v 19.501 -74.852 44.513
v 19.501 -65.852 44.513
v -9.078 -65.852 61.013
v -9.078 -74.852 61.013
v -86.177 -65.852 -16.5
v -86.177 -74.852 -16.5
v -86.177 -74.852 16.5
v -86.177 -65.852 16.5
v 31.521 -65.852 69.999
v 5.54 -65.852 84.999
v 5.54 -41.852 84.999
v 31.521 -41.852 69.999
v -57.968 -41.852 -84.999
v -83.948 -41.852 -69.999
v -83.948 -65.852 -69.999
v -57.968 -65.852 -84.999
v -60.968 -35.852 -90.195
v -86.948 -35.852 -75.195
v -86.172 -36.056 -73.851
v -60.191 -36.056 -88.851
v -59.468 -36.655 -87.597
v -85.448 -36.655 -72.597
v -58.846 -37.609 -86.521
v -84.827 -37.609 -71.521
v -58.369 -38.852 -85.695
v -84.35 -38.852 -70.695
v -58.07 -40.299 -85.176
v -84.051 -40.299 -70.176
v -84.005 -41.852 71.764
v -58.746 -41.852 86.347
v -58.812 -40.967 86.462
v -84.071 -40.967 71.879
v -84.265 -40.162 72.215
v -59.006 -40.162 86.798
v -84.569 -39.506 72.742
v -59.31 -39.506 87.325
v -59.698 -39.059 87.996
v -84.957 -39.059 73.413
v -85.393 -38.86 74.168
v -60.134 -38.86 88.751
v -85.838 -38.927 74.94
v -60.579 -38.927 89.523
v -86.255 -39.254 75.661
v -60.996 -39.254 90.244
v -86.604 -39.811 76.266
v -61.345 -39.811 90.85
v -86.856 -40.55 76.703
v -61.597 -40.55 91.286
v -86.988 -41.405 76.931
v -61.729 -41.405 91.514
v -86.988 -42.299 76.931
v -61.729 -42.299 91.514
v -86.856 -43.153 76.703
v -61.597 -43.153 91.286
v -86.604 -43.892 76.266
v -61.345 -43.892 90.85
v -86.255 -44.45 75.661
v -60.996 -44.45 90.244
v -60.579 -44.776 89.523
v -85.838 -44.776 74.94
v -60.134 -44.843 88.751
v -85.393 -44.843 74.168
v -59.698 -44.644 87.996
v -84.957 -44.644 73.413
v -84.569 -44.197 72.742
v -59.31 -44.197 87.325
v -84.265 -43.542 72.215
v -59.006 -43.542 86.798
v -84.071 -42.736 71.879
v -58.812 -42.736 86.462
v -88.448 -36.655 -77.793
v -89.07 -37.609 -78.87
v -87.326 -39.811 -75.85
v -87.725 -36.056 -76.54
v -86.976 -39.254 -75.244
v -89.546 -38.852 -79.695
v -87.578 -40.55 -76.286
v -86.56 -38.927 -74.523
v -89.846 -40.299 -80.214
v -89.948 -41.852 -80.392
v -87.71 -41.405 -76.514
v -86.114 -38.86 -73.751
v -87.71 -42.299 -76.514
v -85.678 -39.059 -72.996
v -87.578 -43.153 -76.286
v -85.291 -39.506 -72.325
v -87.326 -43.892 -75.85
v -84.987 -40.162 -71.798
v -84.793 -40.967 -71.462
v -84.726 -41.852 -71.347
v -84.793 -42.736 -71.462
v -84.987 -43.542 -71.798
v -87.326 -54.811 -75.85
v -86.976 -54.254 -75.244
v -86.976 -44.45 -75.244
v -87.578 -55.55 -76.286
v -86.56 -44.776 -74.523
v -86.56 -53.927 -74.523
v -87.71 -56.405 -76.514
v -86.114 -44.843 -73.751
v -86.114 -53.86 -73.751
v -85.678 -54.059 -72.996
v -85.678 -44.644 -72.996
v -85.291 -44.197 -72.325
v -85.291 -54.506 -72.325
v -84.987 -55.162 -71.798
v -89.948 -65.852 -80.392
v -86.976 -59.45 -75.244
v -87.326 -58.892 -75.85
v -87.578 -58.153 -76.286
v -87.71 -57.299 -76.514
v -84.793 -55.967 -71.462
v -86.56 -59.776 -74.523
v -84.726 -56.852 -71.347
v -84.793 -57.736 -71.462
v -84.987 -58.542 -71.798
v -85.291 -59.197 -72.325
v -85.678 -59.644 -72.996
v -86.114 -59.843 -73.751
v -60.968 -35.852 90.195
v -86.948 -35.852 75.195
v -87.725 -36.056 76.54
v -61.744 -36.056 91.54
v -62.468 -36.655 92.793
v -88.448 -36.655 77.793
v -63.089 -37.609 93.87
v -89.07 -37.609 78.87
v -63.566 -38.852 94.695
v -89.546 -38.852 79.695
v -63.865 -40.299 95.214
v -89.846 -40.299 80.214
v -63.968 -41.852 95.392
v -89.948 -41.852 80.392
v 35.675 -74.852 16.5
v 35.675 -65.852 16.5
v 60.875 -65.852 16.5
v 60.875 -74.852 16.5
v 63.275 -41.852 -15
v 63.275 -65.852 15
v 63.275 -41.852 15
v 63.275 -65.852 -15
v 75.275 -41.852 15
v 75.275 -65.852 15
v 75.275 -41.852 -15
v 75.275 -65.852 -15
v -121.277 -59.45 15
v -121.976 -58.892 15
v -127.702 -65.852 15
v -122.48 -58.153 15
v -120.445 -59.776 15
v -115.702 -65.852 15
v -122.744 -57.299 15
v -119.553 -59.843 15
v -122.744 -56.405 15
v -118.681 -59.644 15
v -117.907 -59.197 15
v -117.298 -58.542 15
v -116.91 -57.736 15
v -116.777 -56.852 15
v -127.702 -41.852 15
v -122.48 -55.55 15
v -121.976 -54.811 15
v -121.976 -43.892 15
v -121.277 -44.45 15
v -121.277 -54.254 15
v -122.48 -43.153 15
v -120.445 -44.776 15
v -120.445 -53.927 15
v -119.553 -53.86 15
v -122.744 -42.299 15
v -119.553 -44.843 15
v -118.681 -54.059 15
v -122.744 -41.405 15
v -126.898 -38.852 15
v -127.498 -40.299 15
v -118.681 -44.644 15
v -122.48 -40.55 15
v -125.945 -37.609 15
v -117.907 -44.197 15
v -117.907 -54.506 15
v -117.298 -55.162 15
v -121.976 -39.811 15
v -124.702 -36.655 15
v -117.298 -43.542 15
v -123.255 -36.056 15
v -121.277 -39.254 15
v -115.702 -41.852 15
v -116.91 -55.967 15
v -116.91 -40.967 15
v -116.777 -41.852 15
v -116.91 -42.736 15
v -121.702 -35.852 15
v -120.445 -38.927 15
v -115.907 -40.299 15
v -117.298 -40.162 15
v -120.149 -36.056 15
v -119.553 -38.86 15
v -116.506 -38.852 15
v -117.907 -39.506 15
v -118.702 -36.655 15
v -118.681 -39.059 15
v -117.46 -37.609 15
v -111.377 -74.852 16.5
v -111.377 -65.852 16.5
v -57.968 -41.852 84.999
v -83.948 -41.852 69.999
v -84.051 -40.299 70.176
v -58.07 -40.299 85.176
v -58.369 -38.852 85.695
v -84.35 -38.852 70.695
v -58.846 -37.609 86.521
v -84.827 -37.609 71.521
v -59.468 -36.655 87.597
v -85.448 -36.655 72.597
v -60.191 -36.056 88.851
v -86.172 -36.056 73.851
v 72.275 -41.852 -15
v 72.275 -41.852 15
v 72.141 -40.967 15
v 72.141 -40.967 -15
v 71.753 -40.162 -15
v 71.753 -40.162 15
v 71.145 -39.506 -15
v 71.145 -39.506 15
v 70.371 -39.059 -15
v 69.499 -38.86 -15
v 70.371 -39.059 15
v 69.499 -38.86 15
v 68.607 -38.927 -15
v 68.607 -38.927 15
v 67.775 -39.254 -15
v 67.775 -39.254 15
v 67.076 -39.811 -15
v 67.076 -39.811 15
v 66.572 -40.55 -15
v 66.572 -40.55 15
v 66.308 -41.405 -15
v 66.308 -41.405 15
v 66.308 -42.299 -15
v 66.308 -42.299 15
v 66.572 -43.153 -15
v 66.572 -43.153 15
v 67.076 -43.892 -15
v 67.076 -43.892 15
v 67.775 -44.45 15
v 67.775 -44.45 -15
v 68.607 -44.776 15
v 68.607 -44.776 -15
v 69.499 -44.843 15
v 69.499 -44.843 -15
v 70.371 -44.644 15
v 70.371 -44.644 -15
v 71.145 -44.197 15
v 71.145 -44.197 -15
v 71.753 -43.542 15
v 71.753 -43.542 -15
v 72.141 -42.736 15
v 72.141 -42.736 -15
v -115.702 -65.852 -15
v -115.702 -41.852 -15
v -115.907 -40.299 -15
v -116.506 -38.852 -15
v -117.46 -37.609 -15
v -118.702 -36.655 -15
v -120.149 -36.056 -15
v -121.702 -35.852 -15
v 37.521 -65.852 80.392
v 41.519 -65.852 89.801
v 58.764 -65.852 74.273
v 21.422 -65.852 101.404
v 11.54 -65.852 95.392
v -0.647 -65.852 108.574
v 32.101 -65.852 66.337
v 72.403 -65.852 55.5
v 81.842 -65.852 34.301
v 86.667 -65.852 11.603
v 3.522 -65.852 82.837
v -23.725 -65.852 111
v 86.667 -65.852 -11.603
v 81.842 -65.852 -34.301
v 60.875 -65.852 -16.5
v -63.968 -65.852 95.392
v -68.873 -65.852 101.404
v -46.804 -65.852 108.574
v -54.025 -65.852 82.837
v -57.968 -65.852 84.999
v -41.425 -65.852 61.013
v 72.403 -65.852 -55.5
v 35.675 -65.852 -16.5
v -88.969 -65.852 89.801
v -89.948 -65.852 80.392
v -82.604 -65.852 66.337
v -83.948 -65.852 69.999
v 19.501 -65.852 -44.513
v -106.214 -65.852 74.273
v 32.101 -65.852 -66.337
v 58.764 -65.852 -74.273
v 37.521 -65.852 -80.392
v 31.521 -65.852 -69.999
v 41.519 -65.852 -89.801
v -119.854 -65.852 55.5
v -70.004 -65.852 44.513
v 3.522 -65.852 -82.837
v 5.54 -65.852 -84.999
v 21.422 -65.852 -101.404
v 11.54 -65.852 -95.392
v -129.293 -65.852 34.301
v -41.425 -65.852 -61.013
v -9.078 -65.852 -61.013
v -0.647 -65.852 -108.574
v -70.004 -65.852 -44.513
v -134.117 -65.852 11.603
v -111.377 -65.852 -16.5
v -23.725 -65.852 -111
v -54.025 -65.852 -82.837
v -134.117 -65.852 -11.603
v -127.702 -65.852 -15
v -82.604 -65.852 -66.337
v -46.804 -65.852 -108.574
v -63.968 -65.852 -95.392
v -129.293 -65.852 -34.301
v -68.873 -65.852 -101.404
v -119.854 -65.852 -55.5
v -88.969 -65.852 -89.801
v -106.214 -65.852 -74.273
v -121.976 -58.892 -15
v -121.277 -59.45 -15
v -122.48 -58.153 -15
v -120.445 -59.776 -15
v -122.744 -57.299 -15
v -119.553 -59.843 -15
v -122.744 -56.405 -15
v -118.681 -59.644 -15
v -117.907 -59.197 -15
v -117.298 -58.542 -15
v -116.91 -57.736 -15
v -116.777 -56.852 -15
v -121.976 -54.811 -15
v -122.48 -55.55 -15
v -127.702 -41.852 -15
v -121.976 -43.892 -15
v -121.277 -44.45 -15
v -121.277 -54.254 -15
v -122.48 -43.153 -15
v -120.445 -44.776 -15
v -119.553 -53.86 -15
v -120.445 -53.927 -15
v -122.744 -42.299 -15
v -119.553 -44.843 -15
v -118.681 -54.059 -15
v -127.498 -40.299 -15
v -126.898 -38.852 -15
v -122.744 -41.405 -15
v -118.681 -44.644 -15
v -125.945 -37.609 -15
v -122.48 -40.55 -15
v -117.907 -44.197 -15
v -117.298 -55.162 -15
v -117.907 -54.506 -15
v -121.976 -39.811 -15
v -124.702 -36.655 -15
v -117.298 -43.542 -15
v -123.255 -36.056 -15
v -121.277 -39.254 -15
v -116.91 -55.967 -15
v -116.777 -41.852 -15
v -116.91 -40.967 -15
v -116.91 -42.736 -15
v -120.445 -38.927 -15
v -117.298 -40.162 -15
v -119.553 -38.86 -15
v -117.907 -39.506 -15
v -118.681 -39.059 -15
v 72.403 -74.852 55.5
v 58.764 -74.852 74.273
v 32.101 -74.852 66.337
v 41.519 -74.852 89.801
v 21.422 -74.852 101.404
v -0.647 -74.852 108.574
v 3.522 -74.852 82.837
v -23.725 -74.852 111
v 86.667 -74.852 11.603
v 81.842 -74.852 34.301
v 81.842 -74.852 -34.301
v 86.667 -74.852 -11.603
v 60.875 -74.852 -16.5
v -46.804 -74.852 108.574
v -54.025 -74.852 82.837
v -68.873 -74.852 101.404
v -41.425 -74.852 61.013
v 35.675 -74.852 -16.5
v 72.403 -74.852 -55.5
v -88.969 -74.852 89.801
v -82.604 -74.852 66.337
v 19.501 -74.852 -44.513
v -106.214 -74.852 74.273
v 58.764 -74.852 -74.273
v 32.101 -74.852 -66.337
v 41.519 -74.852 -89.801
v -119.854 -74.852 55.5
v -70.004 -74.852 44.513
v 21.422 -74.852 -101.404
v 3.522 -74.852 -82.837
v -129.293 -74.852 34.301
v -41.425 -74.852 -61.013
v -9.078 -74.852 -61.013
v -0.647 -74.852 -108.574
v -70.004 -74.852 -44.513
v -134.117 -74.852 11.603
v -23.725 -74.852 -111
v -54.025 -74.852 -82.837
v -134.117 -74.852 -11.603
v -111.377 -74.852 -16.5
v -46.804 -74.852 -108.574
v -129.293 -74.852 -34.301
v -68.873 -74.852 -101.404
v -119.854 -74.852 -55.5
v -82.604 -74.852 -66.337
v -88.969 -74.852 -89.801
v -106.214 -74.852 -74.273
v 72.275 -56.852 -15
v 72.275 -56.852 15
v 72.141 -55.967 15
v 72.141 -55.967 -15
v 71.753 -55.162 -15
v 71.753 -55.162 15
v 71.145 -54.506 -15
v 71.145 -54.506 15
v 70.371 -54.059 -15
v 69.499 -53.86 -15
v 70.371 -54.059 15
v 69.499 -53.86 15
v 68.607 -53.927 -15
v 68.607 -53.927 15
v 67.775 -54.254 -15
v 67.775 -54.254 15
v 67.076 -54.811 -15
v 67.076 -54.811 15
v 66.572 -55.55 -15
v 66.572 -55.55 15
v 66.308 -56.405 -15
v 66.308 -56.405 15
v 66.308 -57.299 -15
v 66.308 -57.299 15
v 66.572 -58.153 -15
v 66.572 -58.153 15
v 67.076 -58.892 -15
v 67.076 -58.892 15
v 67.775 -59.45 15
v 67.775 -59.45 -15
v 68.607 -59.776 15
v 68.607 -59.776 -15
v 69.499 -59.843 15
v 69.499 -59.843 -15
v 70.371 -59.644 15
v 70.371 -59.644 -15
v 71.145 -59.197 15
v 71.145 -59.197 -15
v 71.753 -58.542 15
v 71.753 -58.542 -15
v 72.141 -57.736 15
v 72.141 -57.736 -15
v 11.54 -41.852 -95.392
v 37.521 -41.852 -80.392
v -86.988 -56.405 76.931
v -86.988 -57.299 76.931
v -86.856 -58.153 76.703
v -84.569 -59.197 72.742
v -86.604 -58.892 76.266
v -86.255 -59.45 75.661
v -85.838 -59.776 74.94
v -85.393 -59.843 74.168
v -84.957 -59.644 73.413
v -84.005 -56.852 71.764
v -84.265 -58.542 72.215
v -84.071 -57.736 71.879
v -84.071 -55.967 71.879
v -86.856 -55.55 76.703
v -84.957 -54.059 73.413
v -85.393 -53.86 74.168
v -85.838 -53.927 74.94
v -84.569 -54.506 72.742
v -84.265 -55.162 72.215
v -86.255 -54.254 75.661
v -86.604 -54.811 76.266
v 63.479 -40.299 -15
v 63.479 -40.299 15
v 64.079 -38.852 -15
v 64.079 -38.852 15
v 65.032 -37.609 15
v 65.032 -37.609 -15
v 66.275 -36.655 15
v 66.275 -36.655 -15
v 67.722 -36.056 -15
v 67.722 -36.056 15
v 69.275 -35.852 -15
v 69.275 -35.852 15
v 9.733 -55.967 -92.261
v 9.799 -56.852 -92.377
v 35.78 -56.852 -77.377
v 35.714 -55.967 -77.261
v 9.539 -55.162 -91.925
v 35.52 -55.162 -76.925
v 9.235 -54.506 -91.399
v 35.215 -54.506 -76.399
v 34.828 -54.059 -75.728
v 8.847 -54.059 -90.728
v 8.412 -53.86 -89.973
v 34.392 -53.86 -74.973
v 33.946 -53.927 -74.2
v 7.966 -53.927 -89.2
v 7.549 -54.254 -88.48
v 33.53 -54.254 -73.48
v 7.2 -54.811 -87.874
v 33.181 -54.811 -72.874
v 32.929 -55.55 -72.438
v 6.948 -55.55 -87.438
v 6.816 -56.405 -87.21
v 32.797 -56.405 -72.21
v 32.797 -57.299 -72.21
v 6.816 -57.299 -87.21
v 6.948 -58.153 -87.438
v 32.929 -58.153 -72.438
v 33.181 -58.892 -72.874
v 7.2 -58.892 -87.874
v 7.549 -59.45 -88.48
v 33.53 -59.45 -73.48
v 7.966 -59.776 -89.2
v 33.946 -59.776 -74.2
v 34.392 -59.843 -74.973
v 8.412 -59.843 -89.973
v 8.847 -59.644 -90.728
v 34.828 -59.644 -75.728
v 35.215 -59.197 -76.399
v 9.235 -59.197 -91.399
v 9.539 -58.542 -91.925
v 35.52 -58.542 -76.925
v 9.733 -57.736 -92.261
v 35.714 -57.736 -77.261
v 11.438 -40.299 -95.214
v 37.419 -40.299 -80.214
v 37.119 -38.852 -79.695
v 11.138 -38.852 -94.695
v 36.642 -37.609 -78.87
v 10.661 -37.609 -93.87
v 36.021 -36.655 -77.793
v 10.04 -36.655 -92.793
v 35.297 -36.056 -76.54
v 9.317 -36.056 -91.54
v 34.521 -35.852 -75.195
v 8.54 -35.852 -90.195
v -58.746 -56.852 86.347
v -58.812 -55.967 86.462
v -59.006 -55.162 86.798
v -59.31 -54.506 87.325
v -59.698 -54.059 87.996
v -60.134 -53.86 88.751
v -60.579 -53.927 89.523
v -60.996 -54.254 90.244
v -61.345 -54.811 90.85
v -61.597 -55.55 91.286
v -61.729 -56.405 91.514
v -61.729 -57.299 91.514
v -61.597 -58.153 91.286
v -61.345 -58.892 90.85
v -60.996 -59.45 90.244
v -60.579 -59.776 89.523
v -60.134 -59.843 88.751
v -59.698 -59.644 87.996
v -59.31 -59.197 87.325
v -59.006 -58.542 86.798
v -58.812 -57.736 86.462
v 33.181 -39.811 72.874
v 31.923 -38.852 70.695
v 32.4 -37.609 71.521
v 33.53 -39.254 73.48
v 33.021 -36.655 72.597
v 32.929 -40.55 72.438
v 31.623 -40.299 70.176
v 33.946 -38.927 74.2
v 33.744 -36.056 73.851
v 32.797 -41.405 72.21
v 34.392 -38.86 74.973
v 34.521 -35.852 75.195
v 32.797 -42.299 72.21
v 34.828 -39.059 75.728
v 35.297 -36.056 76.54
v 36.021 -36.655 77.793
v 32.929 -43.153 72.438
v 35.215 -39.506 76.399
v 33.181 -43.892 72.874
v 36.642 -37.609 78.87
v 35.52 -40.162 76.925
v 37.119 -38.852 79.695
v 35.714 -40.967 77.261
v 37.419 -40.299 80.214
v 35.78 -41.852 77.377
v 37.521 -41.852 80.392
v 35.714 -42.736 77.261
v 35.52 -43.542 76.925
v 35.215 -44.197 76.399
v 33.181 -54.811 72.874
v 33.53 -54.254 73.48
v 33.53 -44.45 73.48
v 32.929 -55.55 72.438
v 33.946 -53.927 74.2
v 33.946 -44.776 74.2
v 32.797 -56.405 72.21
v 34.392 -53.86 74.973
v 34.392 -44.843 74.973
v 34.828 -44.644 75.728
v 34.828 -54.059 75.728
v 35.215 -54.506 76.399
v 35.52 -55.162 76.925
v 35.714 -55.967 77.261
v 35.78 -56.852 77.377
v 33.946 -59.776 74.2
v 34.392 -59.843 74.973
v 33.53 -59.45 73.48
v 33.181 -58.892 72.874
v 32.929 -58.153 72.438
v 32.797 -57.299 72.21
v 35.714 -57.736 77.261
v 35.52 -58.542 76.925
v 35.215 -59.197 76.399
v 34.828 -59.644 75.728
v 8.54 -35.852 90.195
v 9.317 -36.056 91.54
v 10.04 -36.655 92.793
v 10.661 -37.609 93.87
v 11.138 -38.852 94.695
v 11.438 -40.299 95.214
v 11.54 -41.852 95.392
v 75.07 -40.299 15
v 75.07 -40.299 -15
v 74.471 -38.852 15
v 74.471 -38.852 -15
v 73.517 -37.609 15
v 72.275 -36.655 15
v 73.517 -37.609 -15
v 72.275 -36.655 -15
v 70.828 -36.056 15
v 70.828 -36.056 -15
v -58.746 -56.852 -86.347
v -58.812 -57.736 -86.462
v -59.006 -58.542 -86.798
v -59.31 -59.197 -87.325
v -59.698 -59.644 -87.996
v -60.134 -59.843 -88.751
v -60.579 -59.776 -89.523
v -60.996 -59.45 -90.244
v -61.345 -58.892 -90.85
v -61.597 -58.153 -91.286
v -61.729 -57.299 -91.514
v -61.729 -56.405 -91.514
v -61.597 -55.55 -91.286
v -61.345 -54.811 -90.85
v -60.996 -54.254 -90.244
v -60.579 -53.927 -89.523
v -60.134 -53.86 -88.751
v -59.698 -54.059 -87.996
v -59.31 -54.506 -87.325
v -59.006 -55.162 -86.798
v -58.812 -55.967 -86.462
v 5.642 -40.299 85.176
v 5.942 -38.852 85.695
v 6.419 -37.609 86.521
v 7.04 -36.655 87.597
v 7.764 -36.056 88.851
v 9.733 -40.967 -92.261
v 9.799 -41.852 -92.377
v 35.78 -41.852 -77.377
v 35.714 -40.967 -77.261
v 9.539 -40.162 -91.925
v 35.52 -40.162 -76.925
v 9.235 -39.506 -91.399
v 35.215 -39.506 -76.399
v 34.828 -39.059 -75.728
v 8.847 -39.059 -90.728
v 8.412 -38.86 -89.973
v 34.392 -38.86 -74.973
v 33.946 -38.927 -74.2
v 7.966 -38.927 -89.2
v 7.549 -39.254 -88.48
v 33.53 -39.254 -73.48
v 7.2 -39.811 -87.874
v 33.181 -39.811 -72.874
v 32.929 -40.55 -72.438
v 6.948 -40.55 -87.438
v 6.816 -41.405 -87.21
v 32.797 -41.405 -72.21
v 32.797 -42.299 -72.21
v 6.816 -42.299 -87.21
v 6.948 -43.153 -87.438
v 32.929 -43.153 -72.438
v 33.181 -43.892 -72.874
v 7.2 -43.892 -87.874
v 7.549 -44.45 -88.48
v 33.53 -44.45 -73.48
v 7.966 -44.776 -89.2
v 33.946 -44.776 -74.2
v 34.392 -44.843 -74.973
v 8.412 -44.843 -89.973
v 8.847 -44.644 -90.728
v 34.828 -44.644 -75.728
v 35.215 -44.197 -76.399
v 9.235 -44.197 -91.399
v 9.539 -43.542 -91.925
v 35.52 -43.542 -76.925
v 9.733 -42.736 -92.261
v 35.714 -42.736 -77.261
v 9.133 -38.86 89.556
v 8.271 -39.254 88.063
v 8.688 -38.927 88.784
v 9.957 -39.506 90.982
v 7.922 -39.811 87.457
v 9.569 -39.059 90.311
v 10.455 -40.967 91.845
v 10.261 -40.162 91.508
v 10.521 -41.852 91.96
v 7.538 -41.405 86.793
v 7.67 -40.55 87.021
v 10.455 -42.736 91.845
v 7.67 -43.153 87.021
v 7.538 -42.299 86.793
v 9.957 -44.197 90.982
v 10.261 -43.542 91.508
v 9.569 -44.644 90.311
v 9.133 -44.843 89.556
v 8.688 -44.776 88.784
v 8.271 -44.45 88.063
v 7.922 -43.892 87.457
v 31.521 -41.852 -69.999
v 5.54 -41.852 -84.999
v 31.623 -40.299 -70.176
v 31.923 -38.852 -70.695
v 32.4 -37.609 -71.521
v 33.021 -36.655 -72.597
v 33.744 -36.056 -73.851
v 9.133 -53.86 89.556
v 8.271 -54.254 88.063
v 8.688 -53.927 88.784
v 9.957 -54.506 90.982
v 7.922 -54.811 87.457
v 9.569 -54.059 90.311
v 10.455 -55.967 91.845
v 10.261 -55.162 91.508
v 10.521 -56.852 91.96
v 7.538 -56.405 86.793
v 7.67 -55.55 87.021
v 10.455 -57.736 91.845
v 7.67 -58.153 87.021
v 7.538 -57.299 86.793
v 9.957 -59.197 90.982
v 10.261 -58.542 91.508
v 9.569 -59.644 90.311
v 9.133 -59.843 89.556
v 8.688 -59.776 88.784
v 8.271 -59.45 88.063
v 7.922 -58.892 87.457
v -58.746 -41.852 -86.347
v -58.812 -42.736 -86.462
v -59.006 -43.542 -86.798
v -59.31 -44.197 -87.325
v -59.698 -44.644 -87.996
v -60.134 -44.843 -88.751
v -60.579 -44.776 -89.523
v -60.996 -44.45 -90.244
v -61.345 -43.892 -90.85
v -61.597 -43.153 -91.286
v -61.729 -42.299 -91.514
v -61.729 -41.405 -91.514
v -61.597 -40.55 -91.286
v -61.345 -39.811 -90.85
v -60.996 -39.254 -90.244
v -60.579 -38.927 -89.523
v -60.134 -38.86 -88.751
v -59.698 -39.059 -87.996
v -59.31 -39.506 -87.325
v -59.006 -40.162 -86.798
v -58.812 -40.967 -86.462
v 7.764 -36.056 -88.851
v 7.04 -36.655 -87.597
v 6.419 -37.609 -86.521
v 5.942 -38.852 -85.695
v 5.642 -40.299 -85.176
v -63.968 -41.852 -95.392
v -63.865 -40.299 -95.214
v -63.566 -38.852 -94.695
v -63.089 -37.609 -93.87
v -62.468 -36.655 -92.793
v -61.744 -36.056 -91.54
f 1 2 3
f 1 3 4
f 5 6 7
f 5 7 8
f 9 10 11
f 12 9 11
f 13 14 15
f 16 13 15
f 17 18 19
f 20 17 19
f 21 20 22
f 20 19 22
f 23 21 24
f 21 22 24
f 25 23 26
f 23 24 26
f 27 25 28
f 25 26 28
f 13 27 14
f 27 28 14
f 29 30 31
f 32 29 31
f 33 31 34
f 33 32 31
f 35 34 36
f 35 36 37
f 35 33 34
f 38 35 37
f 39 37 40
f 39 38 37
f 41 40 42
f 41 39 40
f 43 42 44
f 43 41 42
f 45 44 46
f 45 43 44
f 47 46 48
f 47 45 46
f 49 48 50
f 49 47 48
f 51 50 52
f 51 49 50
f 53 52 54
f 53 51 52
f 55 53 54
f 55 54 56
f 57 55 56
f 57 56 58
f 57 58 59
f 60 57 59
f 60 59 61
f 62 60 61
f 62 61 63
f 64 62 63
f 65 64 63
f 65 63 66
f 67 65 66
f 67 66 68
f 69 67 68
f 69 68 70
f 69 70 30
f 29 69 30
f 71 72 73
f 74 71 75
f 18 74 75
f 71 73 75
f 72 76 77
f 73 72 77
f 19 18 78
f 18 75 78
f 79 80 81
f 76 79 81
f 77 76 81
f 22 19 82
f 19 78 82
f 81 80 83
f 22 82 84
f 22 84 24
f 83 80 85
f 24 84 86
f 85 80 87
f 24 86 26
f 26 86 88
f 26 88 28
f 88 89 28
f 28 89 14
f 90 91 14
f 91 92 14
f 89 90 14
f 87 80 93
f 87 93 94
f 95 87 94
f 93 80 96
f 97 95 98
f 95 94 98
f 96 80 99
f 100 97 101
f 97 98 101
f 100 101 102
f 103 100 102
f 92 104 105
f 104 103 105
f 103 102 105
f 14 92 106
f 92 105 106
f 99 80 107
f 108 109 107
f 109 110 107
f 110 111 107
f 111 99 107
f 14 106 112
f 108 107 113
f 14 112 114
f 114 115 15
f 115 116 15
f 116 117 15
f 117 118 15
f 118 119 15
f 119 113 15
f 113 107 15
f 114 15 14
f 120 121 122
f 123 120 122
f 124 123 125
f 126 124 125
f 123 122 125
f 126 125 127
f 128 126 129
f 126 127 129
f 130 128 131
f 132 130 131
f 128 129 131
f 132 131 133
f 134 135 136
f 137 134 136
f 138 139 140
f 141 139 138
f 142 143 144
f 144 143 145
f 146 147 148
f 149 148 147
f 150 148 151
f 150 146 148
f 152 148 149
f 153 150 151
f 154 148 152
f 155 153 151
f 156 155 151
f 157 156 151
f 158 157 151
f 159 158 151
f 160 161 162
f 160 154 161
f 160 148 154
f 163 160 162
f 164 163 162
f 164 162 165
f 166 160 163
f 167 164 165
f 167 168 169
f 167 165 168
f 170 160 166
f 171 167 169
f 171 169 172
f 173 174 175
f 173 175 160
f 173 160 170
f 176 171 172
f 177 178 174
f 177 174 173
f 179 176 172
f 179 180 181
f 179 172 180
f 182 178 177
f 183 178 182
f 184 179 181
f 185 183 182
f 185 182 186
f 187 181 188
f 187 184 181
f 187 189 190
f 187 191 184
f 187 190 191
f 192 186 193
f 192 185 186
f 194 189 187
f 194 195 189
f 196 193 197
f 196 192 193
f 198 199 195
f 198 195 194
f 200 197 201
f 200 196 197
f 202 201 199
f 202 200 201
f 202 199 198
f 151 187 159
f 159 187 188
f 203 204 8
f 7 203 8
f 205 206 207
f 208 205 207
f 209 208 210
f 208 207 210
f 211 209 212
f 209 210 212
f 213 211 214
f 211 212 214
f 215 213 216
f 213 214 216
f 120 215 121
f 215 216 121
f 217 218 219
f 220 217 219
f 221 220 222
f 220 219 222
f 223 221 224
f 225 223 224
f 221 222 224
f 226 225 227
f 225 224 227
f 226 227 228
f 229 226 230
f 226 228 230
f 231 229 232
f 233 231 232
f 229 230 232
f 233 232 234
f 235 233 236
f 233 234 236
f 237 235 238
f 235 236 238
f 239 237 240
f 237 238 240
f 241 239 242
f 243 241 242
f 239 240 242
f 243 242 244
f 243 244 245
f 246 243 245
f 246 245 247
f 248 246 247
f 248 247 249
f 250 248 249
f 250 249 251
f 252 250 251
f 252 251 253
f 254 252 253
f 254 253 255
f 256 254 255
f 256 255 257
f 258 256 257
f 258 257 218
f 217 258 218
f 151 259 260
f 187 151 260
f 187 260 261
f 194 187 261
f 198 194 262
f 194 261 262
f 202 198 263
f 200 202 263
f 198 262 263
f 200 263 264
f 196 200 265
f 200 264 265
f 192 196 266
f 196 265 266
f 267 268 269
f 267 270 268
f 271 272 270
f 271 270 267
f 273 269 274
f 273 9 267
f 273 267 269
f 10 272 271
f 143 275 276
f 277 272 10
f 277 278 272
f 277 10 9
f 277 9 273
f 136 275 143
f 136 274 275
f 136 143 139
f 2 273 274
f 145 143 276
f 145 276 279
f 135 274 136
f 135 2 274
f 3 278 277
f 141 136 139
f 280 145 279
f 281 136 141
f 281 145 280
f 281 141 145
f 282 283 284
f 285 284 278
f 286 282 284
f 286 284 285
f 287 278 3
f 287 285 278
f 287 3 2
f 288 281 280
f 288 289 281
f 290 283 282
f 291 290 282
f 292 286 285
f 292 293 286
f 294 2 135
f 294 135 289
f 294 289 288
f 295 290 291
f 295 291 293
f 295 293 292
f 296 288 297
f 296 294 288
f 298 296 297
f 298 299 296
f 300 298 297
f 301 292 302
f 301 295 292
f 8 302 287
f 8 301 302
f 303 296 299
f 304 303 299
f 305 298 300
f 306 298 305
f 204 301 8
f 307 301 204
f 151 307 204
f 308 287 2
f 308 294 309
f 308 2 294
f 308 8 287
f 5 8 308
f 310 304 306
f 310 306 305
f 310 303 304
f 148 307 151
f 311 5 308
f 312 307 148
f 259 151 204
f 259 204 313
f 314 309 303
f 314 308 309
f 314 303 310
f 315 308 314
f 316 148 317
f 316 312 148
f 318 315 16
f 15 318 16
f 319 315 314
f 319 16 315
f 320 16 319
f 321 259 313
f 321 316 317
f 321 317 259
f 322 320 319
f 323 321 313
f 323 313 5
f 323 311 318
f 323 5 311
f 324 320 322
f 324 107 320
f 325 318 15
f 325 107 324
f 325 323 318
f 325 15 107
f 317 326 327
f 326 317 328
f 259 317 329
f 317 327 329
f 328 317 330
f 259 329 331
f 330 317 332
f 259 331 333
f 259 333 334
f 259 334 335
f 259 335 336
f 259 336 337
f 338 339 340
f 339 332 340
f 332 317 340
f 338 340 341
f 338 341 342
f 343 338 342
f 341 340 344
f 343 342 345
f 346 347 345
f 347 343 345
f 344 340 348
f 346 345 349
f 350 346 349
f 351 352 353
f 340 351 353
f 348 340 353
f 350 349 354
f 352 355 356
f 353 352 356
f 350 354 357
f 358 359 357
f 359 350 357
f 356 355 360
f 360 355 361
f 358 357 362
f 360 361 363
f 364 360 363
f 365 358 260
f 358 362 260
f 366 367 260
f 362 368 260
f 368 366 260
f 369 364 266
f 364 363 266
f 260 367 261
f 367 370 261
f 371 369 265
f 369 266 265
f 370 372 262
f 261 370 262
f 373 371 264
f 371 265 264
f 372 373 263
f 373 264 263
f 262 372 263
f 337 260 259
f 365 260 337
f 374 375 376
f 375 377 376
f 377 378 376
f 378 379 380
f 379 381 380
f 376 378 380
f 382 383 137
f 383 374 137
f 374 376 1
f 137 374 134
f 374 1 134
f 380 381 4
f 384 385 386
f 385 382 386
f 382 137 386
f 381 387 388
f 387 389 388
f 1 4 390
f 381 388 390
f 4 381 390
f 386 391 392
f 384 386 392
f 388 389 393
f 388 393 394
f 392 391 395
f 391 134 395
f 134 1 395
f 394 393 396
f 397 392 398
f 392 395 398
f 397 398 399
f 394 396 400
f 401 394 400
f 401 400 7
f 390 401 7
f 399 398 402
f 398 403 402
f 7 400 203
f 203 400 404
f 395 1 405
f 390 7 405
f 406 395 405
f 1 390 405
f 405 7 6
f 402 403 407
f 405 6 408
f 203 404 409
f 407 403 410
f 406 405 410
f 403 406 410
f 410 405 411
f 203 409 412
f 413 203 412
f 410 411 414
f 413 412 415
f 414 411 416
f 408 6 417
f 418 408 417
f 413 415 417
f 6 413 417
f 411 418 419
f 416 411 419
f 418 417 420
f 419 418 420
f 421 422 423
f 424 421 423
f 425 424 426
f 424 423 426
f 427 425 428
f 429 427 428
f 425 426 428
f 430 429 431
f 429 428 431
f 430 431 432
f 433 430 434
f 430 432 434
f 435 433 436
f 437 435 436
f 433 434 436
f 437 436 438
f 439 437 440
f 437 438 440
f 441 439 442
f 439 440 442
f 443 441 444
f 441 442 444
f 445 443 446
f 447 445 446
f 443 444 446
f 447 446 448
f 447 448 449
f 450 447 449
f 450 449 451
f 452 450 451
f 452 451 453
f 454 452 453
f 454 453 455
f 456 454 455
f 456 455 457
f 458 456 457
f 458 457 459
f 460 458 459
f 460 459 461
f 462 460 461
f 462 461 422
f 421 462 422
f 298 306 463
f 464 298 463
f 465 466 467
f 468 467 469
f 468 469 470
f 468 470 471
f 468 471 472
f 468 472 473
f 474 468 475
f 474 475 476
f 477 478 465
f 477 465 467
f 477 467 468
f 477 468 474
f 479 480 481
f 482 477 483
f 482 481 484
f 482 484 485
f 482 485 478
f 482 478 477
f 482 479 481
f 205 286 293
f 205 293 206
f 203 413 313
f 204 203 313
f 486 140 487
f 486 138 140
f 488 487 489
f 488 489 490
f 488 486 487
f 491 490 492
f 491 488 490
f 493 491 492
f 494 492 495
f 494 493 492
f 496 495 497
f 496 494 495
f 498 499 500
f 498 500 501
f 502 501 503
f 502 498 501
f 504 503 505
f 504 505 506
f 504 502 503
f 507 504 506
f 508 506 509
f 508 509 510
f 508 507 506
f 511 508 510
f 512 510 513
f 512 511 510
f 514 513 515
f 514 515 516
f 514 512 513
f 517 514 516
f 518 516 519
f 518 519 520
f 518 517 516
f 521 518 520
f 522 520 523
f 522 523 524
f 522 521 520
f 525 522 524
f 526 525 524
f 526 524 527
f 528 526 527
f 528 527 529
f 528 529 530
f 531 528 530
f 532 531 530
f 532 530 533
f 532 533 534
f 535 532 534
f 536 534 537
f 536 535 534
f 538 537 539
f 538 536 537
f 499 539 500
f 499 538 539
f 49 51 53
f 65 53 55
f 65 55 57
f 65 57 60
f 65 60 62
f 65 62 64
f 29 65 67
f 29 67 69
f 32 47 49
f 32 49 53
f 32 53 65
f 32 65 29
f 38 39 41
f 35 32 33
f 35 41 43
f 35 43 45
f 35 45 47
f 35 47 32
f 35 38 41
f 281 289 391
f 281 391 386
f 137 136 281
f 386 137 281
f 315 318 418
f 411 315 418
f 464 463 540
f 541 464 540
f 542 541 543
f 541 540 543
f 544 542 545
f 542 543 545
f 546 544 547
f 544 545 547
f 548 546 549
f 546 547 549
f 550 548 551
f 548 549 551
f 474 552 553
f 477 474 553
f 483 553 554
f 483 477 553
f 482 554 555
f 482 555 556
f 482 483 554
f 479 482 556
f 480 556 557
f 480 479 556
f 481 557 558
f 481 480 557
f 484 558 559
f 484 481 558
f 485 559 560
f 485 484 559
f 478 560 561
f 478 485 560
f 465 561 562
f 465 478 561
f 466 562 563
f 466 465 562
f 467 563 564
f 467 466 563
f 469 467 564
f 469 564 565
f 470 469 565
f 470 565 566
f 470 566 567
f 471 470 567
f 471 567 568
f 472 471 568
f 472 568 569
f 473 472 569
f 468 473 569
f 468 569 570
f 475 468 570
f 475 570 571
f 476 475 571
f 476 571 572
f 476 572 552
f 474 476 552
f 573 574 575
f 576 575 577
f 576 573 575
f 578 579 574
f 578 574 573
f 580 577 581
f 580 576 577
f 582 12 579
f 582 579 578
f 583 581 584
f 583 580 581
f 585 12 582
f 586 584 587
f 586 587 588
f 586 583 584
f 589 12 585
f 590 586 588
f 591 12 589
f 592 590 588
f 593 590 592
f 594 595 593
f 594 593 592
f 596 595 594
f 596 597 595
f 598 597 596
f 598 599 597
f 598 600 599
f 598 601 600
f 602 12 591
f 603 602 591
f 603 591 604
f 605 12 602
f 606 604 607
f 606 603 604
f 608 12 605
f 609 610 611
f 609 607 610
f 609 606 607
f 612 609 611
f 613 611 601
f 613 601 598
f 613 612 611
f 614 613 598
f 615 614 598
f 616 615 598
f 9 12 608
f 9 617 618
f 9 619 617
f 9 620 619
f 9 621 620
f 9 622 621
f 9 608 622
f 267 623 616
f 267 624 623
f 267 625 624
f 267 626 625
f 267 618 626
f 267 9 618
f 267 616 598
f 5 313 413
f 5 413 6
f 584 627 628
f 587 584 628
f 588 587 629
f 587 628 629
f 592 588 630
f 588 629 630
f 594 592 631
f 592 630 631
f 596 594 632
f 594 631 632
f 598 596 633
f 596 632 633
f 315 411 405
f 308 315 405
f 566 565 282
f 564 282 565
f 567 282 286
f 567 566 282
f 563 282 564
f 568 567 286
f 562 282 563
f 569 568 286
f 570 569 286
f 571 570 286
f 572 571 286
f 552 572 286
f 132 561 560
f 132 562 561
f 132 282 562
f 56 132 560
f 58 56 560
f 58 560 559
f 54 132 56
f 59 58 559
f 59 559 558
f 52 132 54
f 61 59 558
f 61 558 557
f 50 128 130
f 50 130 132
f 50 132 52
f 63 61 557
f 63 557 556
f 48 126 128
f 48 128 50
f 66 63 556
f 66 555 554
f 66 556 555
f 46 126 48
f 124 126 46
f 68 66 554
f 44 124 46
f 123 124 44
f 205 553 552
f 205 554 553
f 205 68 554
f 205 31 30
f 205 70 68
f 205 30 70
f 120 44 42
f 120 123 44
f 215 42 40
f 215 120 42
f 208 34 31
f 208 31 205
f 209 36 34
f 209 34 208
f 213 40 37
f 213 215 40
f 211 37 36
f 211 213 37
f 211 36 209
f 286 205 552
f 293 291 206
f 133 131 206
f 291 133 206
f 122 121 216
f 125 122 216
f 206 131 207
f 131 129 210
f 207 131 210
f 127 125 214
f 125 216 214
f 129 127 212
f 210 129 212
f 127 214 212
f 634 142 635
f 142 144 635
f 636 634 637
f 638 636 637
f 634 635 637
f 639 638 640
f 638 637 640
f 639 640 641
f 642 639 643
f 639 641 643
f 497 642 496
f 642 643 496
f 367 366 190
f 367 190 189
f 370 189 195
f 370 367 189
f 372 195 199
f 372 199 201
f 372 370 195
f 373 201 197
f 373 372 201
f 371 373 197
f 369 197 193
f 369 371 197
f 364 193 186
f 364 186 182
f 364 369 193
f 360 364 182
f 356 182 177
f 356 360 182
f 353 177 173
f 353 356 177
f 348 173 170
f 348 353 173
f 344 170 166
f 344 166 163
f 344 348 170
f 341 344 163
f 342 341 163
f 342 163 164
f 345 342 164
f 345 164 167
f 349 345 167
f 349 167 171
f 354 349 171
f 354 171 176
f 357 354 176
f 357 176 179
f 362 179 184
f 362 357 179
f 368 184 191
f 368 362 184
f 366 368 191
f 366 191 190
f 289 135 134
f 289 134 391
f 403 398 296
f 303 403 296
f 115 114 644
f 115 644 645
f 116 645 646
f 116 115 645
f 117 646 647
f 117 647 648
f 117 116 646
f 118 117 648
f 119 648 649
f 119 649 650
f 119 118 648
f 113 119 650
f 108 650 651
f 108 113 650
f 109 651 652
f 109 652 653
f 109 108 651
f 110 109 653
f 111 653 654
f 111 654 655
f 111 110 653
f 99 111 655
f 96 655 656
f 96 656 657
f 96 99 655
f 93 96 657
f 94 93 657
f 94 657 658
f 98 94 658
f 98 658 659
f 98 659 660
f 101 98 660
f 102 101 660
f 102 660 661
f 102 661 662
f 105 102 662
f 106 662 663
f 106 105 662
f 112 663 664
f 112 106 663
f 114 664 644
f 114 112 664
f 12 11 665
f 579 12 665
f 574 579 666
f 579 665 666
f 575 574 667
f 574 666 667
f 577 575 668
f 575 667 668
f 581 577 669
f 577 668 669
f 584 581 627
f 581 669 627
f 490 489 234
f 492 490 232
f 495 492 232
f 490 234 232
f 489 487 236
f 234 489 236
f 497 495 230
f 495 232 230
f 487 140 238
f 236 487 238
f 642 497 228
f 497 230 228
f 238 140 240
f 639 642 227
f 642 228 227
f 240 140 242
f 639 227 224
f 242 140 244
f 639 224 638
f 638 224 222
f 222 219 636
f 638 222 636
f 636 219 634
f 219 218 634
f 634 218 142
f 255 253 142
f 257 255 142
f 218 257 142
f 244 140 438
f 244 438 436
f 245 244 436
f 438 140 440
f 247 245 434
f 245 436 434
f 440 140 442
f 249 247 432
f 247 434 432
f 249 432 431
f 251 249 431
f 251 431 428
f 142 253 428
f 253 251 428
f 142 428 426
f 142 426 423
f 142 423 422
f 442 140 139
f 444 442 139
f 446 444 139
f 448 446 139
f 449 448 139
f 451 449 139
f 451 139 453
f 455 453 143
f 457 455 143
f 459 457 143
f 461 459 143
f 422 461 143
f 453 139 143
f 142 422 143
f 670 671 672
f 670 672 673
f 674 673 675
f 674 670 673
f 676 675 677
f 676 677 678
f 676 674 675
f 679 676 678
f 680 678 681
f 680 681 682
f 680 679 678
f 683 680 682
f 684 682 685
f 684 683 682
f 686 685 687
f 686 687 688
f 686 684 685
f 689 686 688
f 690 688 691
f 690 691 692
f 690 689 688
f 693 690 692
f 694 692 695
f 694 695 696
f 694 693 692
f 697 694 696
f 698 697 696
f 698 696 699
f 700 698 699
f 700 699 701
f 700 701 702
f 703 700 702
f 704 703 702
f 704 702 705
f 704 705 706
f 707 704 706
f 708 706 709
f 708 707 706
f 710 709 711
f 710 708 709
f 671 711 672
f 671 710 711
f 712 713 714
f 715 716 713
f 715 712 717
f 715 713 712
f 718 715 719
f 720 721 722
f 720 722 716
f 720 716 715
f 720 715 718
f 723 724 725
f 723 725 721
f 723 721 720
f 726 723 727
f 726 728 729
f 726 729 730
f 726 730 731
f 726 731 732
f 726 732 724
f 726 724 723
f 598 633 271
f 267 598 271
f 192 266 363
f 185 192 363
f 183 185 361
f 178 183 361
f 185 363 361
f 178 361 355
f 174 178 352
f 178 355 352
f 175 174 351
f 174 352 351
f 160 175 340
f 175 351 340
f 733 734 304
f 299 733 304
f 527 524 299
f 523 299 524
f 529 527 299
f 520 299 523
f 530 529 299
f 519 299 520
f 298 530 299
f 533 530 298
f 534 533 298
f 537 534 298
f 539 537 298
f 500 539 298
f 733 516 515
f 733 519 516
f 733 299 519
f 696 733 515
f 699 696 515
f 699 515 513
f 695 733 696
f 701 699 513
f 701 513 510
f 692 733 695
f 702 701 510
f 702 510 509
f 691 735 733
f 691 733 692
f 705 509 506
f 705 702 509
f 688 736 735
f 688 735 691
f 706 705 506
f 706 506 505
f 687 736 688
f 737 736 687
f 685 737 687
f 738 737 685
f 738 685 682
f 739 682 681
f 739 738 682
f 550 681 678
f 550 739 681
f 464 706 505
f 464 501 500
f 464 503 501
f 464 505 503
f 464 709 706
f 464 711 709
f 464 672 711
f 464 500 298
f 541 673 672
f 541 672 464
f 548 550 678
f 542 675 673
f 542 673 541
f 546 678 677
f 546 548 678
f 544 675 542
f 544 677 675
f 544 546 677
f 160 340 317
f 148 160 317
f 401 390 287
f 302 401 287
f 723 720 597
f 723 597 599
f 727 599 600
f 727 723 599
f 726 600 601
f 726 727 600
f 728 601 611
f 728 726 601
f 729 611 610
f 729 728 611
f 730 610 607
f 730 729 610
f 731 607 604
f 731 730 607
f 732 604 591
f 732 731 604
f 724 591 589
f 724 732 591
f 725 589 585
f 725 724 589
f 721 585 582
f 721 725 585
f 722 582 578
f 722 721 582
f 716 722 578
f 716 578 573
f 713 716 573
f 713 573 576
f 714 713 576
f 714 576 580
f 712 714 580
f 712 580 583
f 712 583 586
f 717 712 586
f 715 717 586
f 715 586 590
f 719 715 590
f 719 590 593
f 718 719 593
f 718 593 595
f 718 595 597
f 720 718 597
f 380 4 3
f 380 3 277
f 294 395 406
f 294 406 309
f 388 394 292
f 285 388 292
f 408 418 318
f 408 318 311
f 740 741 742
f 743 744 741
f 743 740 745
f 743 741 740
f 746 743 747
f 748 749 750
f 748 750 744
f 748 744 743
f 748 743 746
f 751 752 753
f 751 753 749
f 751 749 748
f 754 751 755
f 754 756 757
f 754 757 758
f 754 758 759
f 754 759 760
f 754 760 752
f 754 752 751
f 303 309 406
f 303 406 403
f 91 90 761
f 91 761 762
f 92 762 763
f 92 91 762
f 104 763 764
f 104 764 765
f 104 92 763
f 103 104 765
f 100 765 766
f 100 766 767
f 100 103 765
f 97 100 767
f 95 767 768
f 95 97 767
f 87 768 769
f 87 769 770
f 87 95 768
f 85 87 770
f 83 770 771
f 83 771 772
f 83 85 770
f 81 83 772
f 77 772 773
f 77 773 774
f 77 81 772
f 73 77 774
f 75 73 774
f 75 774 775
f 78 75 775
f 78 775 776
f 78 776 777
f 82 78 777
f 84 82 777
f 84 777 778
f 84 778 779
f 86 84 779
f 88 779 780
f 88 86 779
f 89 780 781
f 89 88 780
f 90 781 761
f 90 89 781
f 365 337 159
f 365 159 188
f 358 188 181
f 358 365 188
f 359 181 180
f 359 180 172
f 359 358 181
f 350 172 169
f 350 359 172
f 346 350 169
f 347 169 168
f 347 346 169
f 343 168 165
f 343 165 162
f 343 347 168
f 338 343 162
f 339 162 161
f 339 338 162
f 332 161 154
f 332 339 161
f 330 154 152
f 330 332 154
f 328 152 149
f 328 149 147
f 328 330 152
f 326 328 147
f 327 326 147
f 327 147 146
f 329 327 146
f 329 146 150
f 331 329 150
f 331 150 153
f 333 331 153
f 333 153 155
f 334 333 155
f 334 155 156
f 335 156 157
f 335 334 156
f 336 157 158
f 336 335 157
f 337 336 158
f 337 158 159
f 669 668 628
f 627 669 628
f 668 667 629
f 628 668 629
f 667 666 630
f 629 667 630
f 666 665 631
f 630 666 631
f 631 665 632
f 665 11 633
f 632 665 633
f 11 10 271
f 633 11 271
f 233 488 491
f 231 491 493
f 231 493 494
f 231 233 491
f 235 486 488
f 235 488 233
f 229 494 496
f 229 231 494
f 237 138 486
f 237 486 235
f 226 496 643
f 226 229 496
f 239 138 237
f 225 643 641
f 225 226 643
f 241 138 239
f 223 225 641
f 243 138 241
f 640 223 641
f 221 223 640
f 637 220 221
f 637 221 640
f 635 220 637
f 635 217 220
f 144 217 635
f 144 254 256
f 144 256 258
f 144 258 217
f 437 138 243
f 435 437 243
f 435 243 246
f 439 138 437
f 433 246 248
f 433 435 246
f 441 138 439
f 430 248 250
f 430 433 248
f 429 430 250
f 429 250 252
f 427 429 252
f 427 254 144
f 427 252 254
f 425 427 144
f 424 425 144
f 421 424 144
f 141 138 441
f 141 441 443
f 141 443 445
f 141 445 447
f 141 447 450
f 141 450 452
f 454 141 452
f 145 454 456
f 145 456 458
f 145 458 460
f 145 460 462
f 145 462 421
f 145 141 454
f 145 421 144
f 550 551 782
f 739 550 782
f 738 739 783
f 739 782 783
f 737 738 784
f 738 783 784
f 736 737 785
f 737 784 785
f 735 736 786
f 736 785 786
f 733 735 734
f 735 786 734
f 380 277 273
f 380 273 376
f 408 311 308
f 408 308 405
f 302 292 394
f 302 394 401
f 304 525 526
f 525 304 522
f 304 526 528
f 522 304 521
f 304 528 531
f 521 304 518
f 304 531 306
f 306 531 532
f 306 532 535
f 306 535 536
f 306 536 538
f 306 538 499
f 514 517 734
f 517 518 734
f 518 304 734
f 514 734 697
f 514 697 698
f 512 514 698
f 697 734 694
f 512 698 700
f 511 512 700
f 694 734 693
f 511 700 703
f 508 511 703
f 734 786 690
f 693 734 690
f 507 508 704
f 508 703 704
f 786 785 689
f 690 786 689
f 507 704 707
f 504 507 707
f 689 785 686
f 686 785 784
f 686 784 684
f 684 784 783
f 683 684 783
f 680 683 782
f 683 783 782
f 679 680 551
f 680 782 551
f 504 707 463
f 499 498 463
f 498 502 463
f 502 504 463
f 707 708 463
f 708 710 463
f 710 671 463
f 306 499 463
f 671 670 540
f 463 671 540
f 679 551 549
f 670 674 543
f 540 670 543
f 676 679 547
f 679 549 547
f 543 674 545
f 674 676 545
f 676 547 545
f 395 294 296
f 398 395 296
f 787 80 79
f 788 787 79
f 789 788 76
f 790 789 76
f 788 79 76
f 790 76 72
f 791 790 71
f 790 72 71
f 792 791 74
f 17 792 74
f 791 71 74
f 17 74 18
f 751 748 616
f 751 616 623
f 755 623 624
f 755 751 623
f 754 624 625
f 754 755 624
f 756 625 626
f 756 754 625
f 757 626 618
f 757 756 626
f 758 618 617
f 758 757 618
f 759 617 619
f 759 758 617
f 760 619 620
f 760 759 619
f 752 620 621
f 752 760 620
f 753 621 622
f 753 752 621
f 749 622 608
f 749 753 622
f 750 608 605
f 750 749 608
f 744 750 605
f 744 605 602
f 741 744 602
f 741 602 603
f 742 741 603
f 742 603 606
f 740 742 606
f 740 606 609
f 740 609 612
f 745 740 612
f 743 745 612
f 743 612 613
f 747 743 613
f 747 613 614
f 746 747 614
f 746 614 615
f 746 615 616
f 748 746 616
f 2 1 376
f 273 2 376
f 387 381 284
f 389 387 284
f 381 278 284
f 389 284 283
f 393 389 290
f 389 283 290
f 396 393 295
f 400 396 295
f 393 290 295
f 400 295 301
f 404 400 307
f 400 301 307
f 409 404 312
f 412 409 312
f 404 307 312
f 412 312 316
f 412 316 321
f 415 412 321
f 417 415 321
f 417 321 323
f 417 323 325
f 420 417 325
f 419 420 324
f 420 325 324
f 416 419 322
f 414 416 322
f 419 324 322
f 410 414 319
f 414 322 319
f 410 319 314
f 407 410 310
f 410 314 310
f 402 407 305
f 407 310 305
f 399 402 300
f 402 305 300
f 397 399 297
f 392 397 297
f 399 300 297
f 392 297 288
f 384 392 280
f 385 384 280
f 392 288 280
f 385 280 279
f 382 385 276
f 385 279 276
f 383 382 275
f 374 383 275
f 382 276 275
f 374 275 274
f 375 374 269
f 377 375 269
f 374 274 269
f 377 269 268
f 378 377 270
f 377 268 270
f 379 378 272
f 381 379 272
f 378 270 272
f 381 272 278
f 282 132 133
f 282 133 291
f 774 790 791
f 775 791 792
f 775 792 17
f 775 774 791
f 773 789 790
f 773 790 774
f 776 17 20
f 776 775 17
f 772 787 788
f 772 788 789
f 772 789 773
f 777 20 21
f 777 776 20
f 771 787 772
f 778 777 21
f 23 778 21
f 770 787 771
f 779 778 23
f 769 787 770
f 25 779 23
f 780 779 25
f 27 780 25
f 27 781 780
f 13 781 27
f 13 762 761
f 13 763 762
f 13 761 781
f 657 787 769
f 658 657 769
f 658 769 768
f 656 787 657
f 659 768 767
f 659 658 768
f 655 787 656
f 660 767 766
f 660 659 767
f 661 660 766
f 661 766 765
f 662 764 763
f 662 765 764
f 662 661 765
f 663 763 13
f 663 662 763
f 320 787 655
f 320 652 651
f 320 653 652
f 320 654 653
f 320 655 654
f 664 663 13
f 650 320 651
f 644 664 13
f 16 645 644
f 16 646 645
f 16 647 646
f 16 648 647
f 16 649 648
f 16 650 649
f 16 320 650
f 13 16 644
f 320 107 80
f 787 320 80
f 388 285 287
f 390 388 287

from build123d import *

# Parameters (mm, degrees)
SKETCH_6_W                     = 111
SKETCH_6_H                     = 9
SKETCH_7_W                     = 12
SKETCH_7_H                     = 30
EXTRUDE_5_DEPTH                = 30
SKETCH_8_R                     = 3
CUT_EXTRUDE_2_DEPTH            = 200.07204757
FILLET_2_R                     = 6
SKETCH_9_W                     = 25.2
SKETCH_9_H                     = 33
CUT_EXTRUDE_3_DEPTH            = 178.121180423
PATTERN_START                  = -15
PATTERN_CIRCULAR_3_OUTLINE_R   = 3
PATTERN_CIRCULAR_3_DEPTH       = 30
PATTERN_START_2                = -37.701760736
PATTERN_CIRCULAR_3_2_OUTLINE_R = 3
PATTERN_CIRCULAR_3_2_DEPTH     = 30
PATTERN_CIRCULAR_3_3_OUTLINE_R = 3
PATTERN_CIRCULAR_3_3_DEPTH     = 0.833530395
PATTERN_CIRCULAR_3_4_OUTLINE_R = 3
PATTERN_CIRCULAR_3_4_DEPTH     = 30
PATTERN_CIRCULAR_3_5_OUTLINE_R = 3
PATTERN_CIRCULAR_3_5_DEPTH     = 0.833530395
PATTERN_START_3                = -16.5
PATTERN_CIRCULAR_3_6_OUTLINE_W = 25.2
PATTERN_CIRCULAR_3_6_OUTLINE_H = 9
PATTERN_CIRCULAR_3_6_DEPTH     = 33
PATTERN_START_4                = -38.368230341
PATTERN_CIRCULAR_3_7_OUTLINE_W = 25.2
PATTERN_CIRCULAR_3_7_OUTLINE_H = 9
PATTERN_CIRCULAR_3_7_DEPTH     = 33
PATTERN_CIRCULAR_3_8_OUTLINE_W = 25.2
PATTERN_CIRCULAR_3_8_OUTLINE_H = 9
PATTERN_CIRCULAR_3_8_DEPTH     = 33


# Read off the part's stored shape, not the designer's step: 阵列(圆周)3
with BuildPart() as part:
    # 草图6 → 旋转3 (revolve)
    with BuildSketch(Plane.XY, mode=Mode.PRIVATE) as revolve_3_sk:
        with Locations((31.774677383, -70.351637053)):
            Rectangle(SKETCH_6_W, SKETCH_6_H)
    revolve(revolve_3_sk.sketch.rotate(Axis((-23.725322617, -65.851637053, 0), (0, -1, 0)), 90), axis=Axis((-23.725322617, -65.851637053, 0), (0, -1, 0)))

    # 草图7 → 凸台-拉伸5 (add)
    with BuildSketch(Plane(origin=(0, -65.851637053, 0), x_dir=(1, 0, 0), z_dir=(0, 1, 0))):
        with Locations((69.274677383, 0)):
            Rectangle(SKETCH_7_W, SKETCH_7_H)
    extrude(amount=EXTRUDE_5_DEPTH)

    # 草图8 → 切除-拉伸2 (cut, through all)
    with BuildSketch(Plane.XY.offset(15)):
        with Locations((69.274677383, -41.851637053)):
            Circle(SKETCH_8_R)
        with Locations((69.274677383, -56.851637053)):
            Circle(SKETCH_8_R)
    extrude(amount=-CUT_EXTRUDE_2_DEPTH, mode=Mode.SUBTRACT)

    # 圆角2
    fillet_2_edges = [part.edges().sort_by_distance(p)[0] for p in [
        (63.274677383, -35.851637053, 0),
        (75.274677383, -35.851637053, 0),
    ]]
    fillet(fillet_2_edges, radius=FILLET_2_R - 0.0001)  # a hair under: the kernel refuses the full size

    # 草图9 → 切除-拉伸3 (cut, through all)
    with BuildSketch(Plane(origin=(0, -65.851637053, 0), x_dir=(1, 0, 0), z_dir=(0, 1, 0))):
        with Locations((48.274677383, 0)):
            Rectangle(SKETCH_9_W, SKETCH_9_H)
    extrude(amount=-CUT_EXTRUDE_3_DEPTH, mode=Mode.SUBTRACT)

    # 阵列(圆周)3 outline → 阵列(圆周)3 (add)
    with BuildSketch(Plane.XY.offset(PATTERN_START)):
        with BuildLine():
            ThreePointArc((-121.702148071, -35.851637053), (-125.944788758, -37.608996366), (-127.702148071, -41.851637053))
            Line((-127.702148071, -41.851637053), (-127.702148071, -65.851637053))
            Line((-127.702148071, -65.851637053), (-115.702148071, -65.851637053))
            Line((-115.702148071, -65.851637053), (-115.702148071, -41.851637053))
            ThreePointArc((-115.702148071, -41.851637053), (-117.459507384, -37.608996366), (-121.702148071, -35.851637053))
        make_face()
        with Locations((-119.777192079, -56.851637053)):
            Circle(PATTERN_CIRCULAR_3_OUTLINE_R, mode=Mode.SUBTRACT)
        with Locations((-119.777192079, -41.851637053)):
            Circle(PATTERN_CIRCULAR_3_OUTLINE_R, mode=Mode.SUBTRACT)
    extrude(amount=PATTERN_CIRCULAR_3_DEPTH)

    # Pattern Circular 3 2 outline → Pattern Circular 3 2 (add)
    # profile 1 of 2: a face of its own
    with BuildSketch(Plane(origin=(0, 0, 0), x_dir=(0.49999999999999767, 0, -0.86602540378444), z_dir=(0.8660254037844399, 0, 0.49999999999999795)).offset(PATTERN_START_2)):
        with BuildLine():
            Line((76.381545055, -65.851637053), (88.381545055, -65.851637053))
            Line((88.381545055, -65.851637053), (88.381545055, -41.851637053))
            ThreePointArc((88.381545055, -41.851637053), (86.624185742, -37.608996366), (82.381545055, -35.851637053))
            ThreePointArc((82.381545055, -35.851637053), (78.138904368, -37.608996366), (76.381545055, -41.851637053))
            Line((76.381545055, -41.851637053), (76.381545055, -65.851637053))
        make_face()
        with Locations((81.900306057, -56.851637053)):
            Circle(PATTERN_CIRCULAR_3_2_OUTLINE_R, mode=Mode.SUBTRACT)
        with Locations((81.900306057, -41.851637053)):
            Circle(PATTERN_CIRCULAR_3_2_OUTLINE_R, mode=Mode.SUBTRACT)
    # profile 2 of 2: a face of its own
    with BuildSketch(Plane(origin=(0, 0, 0), x_dir=(0.49999999999999767, 0, -0.86602540378444), z_dir=(0.8660254037844399, 0, 0.49999999999999795)).offset(PATTERN_START_2)):
        with BuildLine():
            Line((-114.595280399, -65.851637053), (-102.595280399, -65.851637053))
            Line((-102.595280399, -65.851637053), (-102.595280399, -41.851637053))
            ThreePointArc((-102.595280399, -41.851637053), (-104.352639712, -37.608996366), (-108.595280399, -35.851637053))
            ThreePointArc((-108.595280399, -35.851637053), (-112.837921086, -37.608996366), (-114.595280399, -41.851637053))
            Line((-114.595280399, -41.851637053), (-114.595280399, -65.851637053))
        make_face()
        with Locations((-107.151563405, -56.851637053)):
            Circle(PATTERN_CIRCULAR_3_2_OUTLINE_R, mode=Mode.SUBTRACT)
        with Locations((-107.151563405, -41.851637053)):
            Circle(PATTERN_CIRCULAR_3_2_OUTLINE_R, mode=Mode.SUBTRACT)
    extrude(amount=PATTERN_CIRCULAR_3_2_DEPTH)

    # Pattern Circular 3 3 outline → Pattern Circular 3 3 (add)
    with BuildSketch(Plane(origin=(0, 0, 0), x_dir=(0.49999999999999767, 0, -0.86602540378444), z_dir=(0.8660254037844399, 0, 0.49999999999999795)).offset(PATTERN_START_2)):
        with Locations((-107.151563405, -56.851637053)):
            Circle(PATTERN_CIRCULAR_3_3_OUTLINE_R)
        with Locations((-107.151563405, -41.851637053)):
            Circle(PATTERN_CIRCULAR_3_3_OUTLINE_R)
    extrude(amount=PATTERN_CIRCULAR_3_3_DEPTH)

    # Pattern Circular 3 4 outline → Pattern Circular 3 4 (add)
    # profile 1 of 2: a face of its own
    with BuildSketch(Plane(origin=(0, 0, 0), x_dir=(0.500000000000004, 0, 0.8660254037844363), z_dir=(0.8660254037844363, 0, -0.5000000000000042)).offset(PATTERN_START_2)):
        with BuildLine():
            Line((-102.595280399, 65.851637053), (-114.595280399, 65.851637053))
            Line((-114.595280399, 65.851637053), (-114.595280399, 41.851637053))
            ThreePointArc((-114.595280399, 41.851637053), (-112.837921086, 37.608996366), (-108.595280399, 35.851637053))
            ThreePointArc((-108.595280399, 35.851637053), (-104.352639712, 37.608996366), (-102.595280399, 41.851637053))
            Line((-102.595280399, 41.851637053), (-102.595280399, 65.851637053))
        make_face()
        with Locations((-107.151563405, 41.851637053)):
            Circle(PATTERN_CIRCULAR_3_4_OUTLINE_R, mode=Mode.SUBTRACT)
        with Locations((-107.151563405, 56.851637053)):
            Circle(PATTERN_CIRCULAR_3_4_OUTLINE_R, mode=Mode.SUBTRACT)
    # profile 2 of 2: a face of its own
    with BuildSketch(Plane(origin=(0, 0, 0), x_dir=(0.500000000000004, 0, 0.8660254037844363), z_dir=(0.8660254037844363, 0, -0.5000000000000042)).offset(PATTERN_START_2)):
        with BuildLine():
            Line((88.381545055, 65.851637053), (76.381545055, 65.851637053))
            Line((76.381545055, 65.851637053), (76.381545055, 41.851637053))
            ThreePointArc((76.381545055, 41.851637053), (78.138904368, 37.608996366), (82.381545055, 35.851637053))
            ThreePointArc((82.381545055, 35.851637053), (86.624185742, 37.608996366), (88.381545055, 41.851637053))
            Line((88.381545055, 41.851637053), (88.381545055, 65.851637053))
        make_face()
        with Locations((81.900306057, 41.851637053)):
            Circle(PATTERN_CIRCULAR_3_4_OUTLINE_R, mode=Mode.SUBTRACT)
        with Locations((81.900306057, 56.851637053)):
            Circle(PATTERN_CIRCULAR_3_4_OUTLINE_R, mode=Mode.SUBTRACT)
    extrude(amount=PATTERN_CIRCULAR_3_4_DEPTH)

    # Pattern Circular 3 5 outline → Pattern Circular 3 5 (add)
    with BuildSketch(Plane(origin=(0, 0, 0), x_dir=(0.500000000000004, 0, 0.8660254037844363), z_dir=(0.8660254037844363, 0, -0.5000000000000042)).offset(PATTERN_START_2)):
        with Locations((81.900306057, 56.851637053)):
            Circle(PATTERN_CIRCULAR_3_5_OUTLINE_R)
        with Locations((81.900306057, 41.851637053)):
            Circle(PATTERN_CIRCULAR_3_5_OUTLINE_R)
    extrude(amount=PATTERN_CIRCULAR_3_5_DEPTH)

    # Pattern Circular 3 6 outline → Pattern Circular 3 6 (cut)
    with BuildSketch(Plane.XY.offset(PATTERN_START_3)):
        with Locations((-98.777192079, -70.351637053)):
            Rectangle(PATTERN_CIRCULAR_3_6_OUTLINE_W, PATTERN_CIRCULAR_3_6_OUTLINE_H)
    extrude(amount=PATTERN_CIRCULAR_3_6_DEPTH, mode=Mode.SUBTRACT)

    # Pattern Circular 3 7 outline → Pattern Circular 3 7 (cut)
    with BuildSketch(Plane(origin=(0, 0, 0), x_dir=(0.49999999999999767, 0, -0.86602540378444), z_dir=(0.8660254037844399, 0, 0.49999999999999795)).offset(PATTERN_START_4)):
        with Locations((60.900306057, -70.351637053)):
            Rectangle(PATTERN_CIRCULAR_3_7_OUTLINE_W, PATTERN_CIRCULAR_3_7_OUTLINE_H)
        with Locations((-86.151563405, -70.351637053)):
            Rectangle(PATTERN_CIRCULAR_3_7_OUTLINE_W, PATTERN_CIRCULAR_3_7_OUTLINE_H)
    extrude(amount=PATTERN_CIRCULAR_3_7_DEPTH, mode=Mode.SUBTRACT)

    # Pattern Circular 3 8 outline → Pattern Circular 3 8 (cut)
    with BuildSketch(Plane(origin=(0, 0, 0), x_dir=(0.500000000000004, 0, 0.8660254037844363), z_dir=(0.8660254037844363, 0, -0.5000000000000042)).offset(PATTERN_START_4)):
        with Locations((-86.151563405, 70.351637053)):
            Rectangle(PATTERN_CIRCULAR_3_8_OUTLINE_W, PATTERN_CIRCULAR_3_8_OUTLINE_H)
        with Locations((60.900306057, 70.351637053)):
            Rectangle(PATTERN_CIRCULAR_3_8_OUTLINE_W, PATTERN_CIRCULAR_3_8_OUTLINE_H)
    extrude(amount=PATTERN_CIRCULAR_3_8_DEPTH, mode=Mode.SUBTRACT)


solid = part.part
